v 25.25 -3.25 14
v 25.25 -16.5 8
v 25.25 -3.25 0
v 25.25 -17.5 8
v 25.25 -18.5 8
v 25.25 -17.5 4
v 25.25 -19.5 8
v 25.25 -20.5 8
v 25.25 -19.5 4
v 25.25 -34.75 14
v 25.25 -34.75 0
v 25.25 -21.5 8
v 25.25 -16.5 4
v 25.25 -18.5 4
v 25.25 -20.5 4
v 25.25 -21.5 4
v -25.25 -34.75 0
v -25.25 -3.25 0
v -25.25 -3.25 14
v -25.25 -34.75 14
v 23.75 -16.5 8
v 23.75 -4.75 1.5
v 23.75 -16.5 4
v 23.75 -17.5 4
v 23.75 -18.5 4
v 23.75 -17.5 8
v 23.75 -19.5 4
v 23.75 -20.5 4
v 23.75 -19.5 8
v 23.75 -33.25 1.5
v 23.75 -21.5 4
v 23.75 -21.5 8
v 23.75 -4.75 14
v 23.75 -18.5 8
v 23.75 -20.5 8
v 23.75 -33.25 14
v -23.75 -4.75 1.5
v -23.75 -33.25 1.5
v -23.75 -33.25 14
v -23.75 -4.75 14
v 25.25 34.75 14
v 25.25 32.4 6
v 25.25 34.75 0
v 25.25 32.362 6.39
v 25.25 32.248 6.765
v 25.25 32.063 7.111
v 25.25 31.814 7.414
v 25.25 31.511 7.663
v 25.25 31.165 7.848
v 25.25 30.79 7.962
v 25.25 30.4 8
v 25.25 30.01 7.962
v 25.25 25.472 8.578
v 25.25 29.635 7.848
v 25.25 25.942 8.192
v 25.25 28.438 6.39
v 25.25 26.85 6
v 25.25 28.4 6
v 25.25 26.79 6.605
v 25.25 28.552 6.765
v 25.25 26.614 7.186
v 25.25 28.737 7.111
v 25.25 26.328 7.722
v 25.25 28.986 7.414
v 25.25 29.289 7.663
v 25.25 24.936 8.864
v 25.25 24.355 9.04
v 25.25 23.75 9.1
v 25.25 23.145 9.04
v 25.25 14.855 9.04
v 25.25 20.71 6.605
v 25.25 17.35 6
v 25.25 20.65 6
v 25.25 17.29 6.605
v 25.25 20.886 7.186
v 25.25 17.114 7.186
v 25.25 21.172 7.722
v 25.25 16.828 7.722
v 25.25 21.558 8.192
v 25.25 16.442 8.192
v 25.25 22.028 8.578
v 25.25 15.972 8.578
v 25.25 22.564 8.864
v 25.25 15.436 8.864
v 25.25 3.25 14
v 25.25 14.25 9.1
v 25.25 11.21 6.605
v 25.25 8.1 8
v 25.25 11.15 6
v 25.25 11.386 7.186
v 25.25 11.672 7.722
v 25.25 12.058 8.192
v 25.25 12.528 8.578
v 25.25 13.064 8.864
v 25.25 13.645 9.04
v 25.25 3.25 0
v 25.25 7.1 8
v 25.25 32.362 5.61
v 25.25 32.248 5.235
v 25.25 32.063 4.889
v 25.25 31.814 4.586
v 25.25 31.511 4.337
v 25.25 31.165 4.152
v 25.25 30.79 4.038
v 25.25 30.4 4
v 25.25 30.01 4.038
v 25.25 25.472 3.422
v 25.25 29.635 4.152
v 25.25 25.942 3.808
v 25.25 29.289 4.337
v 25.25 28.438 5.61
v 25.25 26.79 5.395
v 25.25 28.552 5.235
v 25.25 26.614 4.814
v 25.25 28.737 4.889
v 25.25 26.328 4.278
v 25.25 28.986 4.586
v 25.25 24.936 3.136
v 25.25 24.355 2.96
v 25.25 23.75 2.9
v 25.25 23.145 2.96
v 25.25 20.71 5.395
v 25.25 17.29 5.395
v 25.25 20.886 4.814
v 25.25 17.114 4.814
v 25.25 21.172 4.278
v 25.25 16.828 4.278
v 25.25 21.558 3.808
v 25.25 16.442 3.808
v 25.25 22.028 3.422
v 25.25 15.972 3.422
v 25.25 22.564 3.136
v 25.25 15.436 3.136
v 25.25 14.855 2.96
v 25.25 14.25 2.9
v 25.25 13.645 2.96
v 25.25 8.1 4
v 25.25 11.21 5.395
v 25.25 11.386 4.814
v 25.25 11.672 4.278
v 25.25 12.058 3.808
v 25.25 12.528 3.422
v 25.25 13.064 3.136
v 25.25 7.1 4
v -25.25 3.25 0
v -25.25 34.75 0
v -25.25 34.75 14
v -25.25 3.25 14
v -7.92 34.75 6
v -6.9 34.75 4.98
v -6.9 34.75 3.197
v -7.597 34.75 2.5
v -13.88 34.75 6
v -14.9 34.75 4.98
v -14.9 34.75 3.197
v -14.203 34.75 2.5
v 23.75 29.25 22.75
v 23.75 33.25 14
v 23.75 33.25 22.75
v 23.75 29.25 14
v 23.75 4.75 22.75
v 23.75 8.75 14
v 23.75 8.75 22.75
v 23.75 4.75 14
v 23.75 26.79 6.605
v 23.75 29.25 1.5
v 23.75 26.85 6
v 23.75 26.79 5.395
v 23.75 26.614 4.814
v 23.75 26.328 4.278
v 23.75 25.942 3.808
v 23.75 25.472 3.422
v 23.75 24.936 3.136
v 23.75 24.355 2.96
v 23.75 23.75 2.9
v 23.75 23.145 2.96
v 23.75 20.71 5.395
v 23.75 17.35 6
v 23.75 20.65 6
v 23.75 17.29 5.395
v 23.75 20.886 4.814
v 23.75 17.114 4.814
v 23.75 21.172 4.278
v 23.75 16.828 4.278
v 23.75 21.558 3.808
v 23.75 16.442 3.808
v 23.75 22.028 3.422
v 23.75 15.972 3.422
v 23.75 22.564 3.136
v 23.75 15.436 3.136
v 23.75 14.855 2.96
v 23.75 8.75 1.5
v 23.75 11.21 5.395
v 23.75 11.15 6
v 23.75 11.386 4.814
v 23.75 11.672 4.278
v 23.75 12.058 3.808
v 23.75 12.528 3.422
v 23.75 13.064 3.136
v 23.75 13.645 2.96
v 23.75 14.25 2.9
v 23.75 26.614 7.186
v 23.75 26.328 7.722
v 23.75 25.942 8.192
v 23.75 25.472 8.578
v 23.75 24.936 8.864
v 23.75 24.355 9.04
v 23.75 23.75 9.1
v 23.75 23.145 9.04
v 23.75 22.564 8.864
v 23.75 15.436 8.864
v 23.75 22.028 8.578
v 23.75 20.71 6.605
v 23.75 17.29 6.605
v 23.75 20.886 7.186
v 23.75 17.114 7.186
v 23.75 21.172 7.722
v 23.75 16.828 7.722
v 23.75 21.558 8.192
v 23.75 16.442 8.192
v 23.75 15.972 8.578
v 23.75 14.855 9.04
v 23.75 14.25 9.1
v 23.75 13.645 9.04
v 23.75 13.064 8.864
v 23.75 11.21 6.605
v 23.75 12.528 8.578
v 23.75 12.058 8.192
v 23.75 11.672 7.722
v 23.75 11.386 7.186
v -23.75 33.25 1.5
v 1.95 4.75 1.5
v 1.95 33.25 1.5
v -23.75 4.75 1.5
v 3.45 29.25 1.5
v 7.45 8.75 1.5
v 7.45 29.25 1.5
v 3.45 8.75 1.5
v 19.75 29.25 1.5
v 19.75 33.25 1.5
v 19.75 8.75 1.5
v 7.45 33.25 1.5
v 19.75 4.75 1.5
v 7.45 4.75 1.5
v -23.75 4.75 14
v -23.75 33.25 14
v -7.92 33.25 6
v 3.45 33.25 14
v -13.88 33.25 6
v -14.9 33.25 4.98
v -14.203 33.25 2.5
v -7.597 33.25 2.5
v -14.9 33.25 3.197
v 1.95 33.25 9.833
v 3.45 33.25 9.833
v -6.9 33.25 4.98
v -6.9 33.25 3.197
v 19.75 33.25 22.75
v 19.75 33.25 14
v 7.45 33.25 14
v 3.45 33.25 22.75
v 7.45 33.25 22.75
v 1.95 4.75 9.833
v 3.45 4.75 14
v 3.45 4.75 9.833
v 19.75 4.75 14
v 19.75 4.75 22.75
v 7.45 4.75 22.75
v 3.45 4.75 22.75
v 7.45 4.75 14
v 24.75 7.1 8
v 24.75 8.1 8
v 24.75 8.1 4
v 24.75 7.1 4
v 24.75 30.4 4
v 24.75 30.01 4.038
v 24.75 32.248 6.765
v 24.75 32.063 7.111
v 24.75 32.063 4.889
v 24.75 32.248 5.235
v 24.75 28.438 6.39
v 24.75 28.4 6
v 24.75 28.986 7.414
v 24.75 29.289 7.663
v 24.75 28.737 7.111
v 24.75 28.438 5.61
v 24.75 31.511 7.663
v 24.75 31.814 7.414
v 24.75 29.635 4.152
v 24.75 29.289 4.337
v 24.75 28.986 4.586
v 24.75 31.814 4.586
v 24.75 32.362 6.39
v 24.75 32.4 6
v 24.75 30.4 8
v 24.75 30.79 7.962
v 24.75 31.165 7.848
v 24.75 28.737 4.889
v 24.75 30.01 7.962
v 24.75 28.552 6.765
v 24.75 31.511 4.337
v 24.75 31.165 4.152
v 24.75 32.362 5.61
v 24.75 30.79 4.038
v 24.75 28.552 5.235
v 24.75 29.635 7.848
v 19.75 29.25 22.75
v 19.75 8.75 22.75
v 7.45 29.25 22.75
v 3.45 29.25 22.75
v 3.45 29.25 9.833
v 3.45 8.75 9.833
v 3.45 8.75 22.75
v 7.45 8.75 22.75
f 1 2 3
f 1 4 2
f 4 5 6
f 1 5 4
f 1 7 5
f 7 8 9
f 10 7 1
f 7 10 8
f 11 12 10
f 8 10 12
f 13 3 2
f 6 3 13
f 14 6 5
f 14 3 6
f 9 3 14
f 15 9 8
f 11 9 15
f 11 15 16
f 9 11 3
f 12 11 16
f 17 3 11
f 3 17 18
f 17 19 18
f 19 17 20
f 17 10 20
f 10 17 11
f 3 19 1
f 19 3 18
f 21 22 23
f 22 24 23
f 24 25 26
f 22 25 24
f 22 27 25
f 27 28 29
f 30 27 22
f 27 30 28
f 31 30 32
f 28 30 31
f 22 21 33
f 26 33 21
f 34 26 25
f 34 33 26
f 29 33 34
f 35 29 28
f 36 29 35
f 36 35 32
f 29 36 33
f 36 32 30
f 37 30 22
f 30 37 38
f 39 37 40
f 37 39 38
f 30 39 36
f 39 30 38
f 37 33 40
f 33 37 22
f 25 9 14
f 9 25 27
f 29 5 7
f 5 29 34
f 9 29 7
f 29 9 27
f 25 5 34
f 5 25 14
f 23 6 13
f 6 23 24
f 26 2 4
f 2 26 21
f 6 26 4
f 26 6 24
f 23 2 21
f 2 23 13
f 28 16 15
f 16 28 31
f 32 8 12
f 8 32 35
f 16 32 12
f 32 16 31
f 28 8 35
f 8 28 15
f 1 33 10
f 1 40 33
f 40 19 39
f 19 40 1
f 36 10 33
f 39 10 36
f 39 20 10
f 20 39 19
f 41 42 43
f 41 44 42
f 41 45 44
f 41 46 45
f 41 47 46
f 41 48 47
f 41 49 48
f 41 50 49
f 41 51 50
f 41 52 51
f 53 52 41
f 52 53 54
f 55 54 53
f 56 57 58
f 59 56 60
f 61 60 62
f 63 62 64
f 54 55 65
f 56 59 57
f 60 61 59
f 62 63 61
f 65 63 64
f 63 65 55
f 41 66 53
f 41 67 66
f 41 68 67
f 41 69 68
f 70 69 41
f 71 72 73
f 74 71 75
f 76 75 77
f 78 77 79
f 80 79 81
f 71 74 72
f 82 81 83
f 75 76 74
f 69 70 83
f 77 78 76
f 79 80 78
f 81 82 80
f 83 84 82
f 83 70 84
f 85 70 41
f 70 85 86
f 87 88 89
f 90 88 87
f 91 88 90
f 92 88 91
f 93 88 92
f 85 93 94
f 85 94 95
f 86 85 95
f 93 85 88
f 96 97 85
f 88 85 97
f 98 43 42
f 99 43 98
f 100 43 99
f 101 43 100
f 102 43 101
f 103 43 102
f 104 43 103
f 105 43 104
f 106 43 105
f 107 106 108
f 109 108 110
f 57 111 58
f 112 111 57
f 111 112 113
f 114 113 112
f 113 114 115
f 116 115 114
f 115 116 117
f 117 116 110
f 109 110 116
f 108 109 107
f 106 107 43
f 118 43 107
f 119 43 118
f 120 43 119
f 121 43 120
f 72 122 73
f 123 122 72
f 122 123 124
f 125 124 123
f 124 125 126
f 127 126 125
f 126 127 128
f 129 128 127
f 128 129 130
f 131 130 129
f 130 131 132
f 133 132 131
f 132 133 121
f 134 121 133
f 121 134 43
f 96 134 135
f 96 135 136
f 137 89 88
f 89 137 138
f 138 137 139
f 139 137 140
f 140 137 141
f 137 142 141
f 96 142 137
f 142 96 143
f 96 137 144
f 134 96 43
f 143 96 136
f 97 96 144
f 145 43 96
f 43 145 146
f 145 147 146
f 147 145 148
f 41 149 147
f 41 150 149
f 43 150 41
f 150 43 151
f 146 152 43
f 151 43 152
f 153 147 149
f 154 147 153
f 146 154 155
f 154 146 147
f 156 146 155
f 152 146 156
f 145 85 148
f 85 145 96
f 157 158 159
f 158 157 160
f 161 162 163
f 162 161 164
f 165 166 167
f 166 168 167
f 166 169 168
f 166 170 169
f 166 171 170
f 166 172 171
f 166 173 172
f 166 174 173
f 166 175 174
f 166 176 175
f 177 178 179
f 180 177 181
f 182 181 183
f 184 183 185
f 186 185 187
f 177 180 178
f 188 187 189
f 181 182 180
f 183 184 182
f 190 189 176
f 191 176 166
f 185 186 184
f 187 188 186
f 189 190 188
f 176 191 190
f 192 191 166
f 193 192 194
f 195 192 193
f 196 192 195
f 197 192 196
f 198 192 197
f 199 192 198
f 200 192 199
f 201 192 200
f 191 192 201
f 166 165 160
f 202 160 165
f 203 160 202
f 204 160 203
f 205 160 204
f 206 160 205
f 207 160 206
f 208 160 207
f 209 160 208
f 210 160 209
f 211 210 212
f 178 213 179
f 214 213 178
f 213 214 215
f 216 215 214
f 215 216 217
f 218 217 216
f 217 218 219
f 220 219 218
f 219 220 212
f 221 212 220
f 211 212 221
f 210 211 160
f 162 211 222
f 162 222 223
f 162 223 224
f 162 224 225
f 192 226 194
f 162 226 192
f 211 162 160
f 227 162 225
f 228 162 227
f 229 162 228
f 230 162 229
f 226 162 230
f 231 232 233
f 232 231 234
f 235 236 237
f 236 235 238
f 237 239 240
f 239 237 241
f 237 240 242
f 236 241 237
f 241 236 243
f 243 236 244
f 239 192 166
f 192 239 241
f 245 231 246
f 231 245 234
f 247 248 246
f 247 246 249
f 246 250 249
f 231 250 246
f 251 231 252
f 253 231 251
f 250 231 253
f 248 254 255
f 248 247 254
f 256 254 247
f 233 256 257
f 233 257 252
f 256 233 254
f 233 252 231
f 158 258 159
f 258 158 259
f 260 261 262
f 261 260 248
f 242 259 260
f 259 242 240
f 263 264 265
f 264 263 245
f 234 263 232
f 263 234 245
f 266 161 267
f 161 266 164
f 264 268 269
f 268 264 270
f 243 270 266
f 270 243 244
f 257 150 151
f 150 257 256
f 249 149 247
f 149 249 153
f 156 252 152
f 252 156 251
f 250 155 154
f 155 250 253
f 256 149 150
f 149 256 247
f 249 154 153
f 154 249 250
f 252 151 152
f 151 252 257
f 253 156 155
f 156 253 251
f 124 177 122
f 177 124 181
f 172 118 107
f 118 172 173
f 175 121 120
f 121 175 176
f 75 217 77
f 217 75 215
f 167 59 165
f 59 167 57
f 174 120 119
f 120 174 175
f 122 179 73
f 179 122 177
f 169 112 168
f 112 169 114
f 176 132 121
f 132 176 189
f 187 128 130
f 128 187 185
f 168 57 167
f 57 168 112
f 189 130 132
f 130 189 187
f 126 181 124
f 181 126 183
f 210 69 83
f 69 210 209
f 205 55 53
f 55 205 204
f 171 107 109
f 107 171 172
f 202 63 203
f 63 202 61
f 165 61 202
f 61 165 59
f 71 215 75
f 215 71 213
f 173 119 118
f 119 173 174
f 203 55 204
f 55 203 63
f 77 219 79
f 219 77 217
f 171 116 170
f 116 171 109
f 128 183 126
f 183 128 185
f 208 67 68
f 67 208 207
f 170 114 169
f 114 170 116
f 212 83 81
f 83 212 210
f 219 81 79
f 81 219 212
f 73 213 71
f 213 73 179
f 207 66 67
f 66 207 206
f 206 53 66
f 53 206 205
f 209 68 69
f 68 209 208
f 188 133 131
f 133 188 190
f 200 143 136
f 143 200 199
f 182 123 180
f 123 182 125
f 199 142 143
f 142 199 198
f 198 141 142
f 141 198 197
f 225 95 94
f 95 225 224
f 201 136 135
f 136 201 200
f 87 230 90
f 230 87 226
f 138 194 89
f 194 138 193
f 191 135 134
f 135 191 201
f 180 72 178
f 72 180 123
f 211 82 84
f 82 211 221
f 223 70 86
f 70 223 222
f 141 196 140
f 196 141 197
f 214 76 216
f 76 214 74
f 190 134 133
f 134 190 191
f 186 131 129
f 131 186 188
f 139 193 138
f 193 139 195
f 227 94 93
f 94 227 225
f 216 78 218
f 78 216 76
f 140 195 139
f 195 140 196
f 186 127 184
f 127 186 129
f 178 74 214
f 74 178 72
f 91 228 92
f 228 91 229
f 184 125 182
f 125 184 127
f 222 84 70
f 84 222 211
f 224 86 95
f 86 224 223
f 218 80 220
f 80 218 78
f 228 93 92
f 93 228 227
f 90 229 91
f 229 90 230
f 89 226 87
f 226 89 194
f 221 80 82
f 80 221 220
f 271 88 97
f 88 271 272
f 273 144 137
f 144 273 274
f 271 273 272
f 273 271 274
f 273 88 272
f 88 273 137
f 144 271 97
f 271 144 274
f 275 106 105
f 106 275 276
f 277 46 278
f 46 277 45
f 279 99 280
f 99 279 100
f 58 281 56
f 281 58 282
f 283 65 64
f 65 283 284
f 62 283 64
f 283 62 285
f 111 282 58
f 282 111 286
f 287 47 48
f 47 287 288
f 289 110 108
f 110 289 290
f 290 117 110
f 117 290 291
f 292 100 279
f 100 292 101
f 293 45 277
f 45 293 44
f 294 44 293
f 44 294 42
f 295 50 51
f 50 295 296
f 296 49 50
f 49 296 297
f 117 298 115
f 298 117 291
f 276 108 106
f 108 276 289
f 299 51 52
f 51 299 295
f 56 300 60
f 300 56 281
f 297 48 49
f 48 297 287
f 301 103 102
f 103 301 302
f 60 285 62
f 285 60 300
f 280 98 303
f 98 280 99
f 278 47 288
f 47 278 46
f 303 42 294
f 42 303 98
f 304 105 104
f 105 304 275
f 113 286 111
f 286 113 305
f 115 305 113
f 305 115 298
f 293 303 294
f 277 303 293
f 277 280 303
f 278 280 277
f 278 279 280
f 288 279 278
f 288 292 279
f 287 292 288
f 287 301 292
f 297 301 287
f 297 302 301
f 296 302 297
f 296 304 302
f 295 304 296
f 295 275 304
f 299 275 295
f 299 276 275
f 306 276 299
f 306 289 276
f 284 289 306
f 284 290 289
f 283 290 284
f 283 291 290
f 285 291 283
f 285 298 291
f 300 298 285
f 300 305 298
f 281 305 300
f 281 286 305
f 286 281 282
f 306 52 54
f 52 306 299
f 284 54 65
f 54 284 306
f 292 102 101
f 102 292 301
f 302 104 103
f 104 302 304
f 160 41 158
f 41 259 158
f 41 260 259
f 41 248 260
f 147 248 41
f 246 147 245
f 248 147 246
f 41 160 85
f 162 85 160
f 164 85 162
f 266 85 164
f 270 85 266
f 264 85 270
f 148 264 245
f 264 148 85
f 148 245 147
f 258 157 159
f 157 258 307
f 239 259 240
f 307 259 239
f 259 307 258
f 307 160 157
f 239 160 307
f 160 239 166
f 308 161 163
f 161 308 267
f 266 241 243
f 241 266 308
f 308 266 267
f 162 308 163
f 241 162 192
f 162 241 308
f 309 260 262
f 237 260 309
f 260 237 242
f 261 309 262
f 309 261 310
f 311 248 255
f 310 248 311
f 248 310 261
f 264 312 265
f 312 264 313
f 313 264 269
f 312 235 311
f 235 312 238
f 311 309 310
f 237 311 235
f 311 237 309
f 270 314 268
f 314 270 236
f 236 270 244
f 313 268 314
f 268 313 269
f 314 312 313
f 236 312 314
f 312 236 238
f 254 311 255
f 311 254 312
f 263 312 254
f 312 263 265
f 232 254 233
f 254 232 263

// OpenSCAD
w = 47.5;
h = 25;
d = 28.5;
t=1.5;

usbw = 8;
usbh = 3.5;
usbl = 1;

mdw = 25.7;

ss = 4;
ps = 4;

module box() {
	difference() {
		cube([w+2*t, d+2*t, h+2*t], center=true);
		cube([w, d, h], center=true);
	}
}

module topSlice() { translate([0,0,h/2]) cube([w+2*t+1, d+2*t+2, h], center=true); }
module bottomSlice() { translate([0,0,-h/2]) cube([w+2*t+1, d+2*t+2, h], center=true); }

module ports() {
	module usb() {
		// cube([usbw, usbh, t+2], center = true);
		d1 = 11;
		d2 = 9;
		difference() {
			cube([usbw, t+2, usbh], center = true);
			translate([(usbw/2+usbw/d1), 0, (usbh/2+usbw/d1)]) rotate([0, 45, 0]) cube([3, t+2, usbh], center = true);
			translate([-(usbw/2+usbw/d1), 0, (usbh/2+usbw/d1)]) rotate([0, -45, 0]) cube([3, t+2, usbh], center = true);
			translate([(usbw/2+usbw/d2), 0, -(usbh/2+usbw/d2)]) rotate([0, -45, 0]) cube([3, t+2, usbh], center = true);
			translate([-(usbw/2+usbw/d2), 0, -(usbh/2+usbw/d2)]) rotate([0, 45, 0]) cube([3, t+2, usbh], center = true);
		}
	}
	translate([w/2-1, d/6, -8]) rotate([0, 90, 0]) cylinder(r=6.2/2, h=t+2, $fn=32);
	translate([w/2-1, -d/6, -8]) rotate([0, 90, 0]) cylinder(r=6.2/2, h=t+2, $fn=32);
	translate([-(w/2-mdw/2), d/2+t/2, -(h/2-(usbh/2)-usbl)]) usb();
}

module divider() {
	translate([mdw-(w/2-t/2), 0, -(h/2-(h/6))]) cube([t, d, h/3], center=true);
}

module pegs() {
		translate([(w/2-ps/2), (d/2-ps/2), -h/10]) cube([ps, ps, h-h/10], center=true);
		translate([(w/2-ps/2), -(d/2-ps/2), -h/10]) cube([ps, ps, h-h/10], center=true);

		translate([mdw-(w/2-t/2)+t/2+ps/2, (d/2-ps/2), -h/10]) cube([ps, ps, h-h/10], center=true);
		translate([mdw-(w/2-t/2)+t/2+ps/2, -(d/2-ps/2), -h/10]) cube([ps, ps, h-h/10], center=true);
}

module indicators() {
	translate([w/2+t/2, 0, 8]) slit();
	translate([w/2+t/2, -2, 8]) slit();
	translate([w/2+t/2, 2, 8]) slit();
}

module symbols() {
	translate([w/2+t, -(d/2-(d/10)), -8]) one();
	translate([w/2+t, (d/2-(d/10)), -8]) zero();
}

module zero() {
	rotate([0, 90, 0]) linear_extrude(height=1, center=true) circle(r=ss/2, $fn=32);
}

module one() {
	cube([1, 1, ss], center=true);
}

module slit() {
	cube([2*t, 1, ss], center=true);
}

module top() {
	difference() {
		box();
		bottomSlice();
		indicators();
	}
}

module bottom() {
	union() {
		difference() {
			box();
			topSlice();
			ports();
			symbols();
		}
		pegs();
		divider();
	}
}

module enclosure() {
	translate([0,-(d/2+(d/6)),(h/2+t)]) rotate([180, 0, 0]) top();
	translate([0,(d/2+(d/6)),(h/2+t)]) bottom();
	
	//translate([0,0,(h/2+t)]) rotate([180, 0, 0]) top();
	//bottom
}

enclosure();
